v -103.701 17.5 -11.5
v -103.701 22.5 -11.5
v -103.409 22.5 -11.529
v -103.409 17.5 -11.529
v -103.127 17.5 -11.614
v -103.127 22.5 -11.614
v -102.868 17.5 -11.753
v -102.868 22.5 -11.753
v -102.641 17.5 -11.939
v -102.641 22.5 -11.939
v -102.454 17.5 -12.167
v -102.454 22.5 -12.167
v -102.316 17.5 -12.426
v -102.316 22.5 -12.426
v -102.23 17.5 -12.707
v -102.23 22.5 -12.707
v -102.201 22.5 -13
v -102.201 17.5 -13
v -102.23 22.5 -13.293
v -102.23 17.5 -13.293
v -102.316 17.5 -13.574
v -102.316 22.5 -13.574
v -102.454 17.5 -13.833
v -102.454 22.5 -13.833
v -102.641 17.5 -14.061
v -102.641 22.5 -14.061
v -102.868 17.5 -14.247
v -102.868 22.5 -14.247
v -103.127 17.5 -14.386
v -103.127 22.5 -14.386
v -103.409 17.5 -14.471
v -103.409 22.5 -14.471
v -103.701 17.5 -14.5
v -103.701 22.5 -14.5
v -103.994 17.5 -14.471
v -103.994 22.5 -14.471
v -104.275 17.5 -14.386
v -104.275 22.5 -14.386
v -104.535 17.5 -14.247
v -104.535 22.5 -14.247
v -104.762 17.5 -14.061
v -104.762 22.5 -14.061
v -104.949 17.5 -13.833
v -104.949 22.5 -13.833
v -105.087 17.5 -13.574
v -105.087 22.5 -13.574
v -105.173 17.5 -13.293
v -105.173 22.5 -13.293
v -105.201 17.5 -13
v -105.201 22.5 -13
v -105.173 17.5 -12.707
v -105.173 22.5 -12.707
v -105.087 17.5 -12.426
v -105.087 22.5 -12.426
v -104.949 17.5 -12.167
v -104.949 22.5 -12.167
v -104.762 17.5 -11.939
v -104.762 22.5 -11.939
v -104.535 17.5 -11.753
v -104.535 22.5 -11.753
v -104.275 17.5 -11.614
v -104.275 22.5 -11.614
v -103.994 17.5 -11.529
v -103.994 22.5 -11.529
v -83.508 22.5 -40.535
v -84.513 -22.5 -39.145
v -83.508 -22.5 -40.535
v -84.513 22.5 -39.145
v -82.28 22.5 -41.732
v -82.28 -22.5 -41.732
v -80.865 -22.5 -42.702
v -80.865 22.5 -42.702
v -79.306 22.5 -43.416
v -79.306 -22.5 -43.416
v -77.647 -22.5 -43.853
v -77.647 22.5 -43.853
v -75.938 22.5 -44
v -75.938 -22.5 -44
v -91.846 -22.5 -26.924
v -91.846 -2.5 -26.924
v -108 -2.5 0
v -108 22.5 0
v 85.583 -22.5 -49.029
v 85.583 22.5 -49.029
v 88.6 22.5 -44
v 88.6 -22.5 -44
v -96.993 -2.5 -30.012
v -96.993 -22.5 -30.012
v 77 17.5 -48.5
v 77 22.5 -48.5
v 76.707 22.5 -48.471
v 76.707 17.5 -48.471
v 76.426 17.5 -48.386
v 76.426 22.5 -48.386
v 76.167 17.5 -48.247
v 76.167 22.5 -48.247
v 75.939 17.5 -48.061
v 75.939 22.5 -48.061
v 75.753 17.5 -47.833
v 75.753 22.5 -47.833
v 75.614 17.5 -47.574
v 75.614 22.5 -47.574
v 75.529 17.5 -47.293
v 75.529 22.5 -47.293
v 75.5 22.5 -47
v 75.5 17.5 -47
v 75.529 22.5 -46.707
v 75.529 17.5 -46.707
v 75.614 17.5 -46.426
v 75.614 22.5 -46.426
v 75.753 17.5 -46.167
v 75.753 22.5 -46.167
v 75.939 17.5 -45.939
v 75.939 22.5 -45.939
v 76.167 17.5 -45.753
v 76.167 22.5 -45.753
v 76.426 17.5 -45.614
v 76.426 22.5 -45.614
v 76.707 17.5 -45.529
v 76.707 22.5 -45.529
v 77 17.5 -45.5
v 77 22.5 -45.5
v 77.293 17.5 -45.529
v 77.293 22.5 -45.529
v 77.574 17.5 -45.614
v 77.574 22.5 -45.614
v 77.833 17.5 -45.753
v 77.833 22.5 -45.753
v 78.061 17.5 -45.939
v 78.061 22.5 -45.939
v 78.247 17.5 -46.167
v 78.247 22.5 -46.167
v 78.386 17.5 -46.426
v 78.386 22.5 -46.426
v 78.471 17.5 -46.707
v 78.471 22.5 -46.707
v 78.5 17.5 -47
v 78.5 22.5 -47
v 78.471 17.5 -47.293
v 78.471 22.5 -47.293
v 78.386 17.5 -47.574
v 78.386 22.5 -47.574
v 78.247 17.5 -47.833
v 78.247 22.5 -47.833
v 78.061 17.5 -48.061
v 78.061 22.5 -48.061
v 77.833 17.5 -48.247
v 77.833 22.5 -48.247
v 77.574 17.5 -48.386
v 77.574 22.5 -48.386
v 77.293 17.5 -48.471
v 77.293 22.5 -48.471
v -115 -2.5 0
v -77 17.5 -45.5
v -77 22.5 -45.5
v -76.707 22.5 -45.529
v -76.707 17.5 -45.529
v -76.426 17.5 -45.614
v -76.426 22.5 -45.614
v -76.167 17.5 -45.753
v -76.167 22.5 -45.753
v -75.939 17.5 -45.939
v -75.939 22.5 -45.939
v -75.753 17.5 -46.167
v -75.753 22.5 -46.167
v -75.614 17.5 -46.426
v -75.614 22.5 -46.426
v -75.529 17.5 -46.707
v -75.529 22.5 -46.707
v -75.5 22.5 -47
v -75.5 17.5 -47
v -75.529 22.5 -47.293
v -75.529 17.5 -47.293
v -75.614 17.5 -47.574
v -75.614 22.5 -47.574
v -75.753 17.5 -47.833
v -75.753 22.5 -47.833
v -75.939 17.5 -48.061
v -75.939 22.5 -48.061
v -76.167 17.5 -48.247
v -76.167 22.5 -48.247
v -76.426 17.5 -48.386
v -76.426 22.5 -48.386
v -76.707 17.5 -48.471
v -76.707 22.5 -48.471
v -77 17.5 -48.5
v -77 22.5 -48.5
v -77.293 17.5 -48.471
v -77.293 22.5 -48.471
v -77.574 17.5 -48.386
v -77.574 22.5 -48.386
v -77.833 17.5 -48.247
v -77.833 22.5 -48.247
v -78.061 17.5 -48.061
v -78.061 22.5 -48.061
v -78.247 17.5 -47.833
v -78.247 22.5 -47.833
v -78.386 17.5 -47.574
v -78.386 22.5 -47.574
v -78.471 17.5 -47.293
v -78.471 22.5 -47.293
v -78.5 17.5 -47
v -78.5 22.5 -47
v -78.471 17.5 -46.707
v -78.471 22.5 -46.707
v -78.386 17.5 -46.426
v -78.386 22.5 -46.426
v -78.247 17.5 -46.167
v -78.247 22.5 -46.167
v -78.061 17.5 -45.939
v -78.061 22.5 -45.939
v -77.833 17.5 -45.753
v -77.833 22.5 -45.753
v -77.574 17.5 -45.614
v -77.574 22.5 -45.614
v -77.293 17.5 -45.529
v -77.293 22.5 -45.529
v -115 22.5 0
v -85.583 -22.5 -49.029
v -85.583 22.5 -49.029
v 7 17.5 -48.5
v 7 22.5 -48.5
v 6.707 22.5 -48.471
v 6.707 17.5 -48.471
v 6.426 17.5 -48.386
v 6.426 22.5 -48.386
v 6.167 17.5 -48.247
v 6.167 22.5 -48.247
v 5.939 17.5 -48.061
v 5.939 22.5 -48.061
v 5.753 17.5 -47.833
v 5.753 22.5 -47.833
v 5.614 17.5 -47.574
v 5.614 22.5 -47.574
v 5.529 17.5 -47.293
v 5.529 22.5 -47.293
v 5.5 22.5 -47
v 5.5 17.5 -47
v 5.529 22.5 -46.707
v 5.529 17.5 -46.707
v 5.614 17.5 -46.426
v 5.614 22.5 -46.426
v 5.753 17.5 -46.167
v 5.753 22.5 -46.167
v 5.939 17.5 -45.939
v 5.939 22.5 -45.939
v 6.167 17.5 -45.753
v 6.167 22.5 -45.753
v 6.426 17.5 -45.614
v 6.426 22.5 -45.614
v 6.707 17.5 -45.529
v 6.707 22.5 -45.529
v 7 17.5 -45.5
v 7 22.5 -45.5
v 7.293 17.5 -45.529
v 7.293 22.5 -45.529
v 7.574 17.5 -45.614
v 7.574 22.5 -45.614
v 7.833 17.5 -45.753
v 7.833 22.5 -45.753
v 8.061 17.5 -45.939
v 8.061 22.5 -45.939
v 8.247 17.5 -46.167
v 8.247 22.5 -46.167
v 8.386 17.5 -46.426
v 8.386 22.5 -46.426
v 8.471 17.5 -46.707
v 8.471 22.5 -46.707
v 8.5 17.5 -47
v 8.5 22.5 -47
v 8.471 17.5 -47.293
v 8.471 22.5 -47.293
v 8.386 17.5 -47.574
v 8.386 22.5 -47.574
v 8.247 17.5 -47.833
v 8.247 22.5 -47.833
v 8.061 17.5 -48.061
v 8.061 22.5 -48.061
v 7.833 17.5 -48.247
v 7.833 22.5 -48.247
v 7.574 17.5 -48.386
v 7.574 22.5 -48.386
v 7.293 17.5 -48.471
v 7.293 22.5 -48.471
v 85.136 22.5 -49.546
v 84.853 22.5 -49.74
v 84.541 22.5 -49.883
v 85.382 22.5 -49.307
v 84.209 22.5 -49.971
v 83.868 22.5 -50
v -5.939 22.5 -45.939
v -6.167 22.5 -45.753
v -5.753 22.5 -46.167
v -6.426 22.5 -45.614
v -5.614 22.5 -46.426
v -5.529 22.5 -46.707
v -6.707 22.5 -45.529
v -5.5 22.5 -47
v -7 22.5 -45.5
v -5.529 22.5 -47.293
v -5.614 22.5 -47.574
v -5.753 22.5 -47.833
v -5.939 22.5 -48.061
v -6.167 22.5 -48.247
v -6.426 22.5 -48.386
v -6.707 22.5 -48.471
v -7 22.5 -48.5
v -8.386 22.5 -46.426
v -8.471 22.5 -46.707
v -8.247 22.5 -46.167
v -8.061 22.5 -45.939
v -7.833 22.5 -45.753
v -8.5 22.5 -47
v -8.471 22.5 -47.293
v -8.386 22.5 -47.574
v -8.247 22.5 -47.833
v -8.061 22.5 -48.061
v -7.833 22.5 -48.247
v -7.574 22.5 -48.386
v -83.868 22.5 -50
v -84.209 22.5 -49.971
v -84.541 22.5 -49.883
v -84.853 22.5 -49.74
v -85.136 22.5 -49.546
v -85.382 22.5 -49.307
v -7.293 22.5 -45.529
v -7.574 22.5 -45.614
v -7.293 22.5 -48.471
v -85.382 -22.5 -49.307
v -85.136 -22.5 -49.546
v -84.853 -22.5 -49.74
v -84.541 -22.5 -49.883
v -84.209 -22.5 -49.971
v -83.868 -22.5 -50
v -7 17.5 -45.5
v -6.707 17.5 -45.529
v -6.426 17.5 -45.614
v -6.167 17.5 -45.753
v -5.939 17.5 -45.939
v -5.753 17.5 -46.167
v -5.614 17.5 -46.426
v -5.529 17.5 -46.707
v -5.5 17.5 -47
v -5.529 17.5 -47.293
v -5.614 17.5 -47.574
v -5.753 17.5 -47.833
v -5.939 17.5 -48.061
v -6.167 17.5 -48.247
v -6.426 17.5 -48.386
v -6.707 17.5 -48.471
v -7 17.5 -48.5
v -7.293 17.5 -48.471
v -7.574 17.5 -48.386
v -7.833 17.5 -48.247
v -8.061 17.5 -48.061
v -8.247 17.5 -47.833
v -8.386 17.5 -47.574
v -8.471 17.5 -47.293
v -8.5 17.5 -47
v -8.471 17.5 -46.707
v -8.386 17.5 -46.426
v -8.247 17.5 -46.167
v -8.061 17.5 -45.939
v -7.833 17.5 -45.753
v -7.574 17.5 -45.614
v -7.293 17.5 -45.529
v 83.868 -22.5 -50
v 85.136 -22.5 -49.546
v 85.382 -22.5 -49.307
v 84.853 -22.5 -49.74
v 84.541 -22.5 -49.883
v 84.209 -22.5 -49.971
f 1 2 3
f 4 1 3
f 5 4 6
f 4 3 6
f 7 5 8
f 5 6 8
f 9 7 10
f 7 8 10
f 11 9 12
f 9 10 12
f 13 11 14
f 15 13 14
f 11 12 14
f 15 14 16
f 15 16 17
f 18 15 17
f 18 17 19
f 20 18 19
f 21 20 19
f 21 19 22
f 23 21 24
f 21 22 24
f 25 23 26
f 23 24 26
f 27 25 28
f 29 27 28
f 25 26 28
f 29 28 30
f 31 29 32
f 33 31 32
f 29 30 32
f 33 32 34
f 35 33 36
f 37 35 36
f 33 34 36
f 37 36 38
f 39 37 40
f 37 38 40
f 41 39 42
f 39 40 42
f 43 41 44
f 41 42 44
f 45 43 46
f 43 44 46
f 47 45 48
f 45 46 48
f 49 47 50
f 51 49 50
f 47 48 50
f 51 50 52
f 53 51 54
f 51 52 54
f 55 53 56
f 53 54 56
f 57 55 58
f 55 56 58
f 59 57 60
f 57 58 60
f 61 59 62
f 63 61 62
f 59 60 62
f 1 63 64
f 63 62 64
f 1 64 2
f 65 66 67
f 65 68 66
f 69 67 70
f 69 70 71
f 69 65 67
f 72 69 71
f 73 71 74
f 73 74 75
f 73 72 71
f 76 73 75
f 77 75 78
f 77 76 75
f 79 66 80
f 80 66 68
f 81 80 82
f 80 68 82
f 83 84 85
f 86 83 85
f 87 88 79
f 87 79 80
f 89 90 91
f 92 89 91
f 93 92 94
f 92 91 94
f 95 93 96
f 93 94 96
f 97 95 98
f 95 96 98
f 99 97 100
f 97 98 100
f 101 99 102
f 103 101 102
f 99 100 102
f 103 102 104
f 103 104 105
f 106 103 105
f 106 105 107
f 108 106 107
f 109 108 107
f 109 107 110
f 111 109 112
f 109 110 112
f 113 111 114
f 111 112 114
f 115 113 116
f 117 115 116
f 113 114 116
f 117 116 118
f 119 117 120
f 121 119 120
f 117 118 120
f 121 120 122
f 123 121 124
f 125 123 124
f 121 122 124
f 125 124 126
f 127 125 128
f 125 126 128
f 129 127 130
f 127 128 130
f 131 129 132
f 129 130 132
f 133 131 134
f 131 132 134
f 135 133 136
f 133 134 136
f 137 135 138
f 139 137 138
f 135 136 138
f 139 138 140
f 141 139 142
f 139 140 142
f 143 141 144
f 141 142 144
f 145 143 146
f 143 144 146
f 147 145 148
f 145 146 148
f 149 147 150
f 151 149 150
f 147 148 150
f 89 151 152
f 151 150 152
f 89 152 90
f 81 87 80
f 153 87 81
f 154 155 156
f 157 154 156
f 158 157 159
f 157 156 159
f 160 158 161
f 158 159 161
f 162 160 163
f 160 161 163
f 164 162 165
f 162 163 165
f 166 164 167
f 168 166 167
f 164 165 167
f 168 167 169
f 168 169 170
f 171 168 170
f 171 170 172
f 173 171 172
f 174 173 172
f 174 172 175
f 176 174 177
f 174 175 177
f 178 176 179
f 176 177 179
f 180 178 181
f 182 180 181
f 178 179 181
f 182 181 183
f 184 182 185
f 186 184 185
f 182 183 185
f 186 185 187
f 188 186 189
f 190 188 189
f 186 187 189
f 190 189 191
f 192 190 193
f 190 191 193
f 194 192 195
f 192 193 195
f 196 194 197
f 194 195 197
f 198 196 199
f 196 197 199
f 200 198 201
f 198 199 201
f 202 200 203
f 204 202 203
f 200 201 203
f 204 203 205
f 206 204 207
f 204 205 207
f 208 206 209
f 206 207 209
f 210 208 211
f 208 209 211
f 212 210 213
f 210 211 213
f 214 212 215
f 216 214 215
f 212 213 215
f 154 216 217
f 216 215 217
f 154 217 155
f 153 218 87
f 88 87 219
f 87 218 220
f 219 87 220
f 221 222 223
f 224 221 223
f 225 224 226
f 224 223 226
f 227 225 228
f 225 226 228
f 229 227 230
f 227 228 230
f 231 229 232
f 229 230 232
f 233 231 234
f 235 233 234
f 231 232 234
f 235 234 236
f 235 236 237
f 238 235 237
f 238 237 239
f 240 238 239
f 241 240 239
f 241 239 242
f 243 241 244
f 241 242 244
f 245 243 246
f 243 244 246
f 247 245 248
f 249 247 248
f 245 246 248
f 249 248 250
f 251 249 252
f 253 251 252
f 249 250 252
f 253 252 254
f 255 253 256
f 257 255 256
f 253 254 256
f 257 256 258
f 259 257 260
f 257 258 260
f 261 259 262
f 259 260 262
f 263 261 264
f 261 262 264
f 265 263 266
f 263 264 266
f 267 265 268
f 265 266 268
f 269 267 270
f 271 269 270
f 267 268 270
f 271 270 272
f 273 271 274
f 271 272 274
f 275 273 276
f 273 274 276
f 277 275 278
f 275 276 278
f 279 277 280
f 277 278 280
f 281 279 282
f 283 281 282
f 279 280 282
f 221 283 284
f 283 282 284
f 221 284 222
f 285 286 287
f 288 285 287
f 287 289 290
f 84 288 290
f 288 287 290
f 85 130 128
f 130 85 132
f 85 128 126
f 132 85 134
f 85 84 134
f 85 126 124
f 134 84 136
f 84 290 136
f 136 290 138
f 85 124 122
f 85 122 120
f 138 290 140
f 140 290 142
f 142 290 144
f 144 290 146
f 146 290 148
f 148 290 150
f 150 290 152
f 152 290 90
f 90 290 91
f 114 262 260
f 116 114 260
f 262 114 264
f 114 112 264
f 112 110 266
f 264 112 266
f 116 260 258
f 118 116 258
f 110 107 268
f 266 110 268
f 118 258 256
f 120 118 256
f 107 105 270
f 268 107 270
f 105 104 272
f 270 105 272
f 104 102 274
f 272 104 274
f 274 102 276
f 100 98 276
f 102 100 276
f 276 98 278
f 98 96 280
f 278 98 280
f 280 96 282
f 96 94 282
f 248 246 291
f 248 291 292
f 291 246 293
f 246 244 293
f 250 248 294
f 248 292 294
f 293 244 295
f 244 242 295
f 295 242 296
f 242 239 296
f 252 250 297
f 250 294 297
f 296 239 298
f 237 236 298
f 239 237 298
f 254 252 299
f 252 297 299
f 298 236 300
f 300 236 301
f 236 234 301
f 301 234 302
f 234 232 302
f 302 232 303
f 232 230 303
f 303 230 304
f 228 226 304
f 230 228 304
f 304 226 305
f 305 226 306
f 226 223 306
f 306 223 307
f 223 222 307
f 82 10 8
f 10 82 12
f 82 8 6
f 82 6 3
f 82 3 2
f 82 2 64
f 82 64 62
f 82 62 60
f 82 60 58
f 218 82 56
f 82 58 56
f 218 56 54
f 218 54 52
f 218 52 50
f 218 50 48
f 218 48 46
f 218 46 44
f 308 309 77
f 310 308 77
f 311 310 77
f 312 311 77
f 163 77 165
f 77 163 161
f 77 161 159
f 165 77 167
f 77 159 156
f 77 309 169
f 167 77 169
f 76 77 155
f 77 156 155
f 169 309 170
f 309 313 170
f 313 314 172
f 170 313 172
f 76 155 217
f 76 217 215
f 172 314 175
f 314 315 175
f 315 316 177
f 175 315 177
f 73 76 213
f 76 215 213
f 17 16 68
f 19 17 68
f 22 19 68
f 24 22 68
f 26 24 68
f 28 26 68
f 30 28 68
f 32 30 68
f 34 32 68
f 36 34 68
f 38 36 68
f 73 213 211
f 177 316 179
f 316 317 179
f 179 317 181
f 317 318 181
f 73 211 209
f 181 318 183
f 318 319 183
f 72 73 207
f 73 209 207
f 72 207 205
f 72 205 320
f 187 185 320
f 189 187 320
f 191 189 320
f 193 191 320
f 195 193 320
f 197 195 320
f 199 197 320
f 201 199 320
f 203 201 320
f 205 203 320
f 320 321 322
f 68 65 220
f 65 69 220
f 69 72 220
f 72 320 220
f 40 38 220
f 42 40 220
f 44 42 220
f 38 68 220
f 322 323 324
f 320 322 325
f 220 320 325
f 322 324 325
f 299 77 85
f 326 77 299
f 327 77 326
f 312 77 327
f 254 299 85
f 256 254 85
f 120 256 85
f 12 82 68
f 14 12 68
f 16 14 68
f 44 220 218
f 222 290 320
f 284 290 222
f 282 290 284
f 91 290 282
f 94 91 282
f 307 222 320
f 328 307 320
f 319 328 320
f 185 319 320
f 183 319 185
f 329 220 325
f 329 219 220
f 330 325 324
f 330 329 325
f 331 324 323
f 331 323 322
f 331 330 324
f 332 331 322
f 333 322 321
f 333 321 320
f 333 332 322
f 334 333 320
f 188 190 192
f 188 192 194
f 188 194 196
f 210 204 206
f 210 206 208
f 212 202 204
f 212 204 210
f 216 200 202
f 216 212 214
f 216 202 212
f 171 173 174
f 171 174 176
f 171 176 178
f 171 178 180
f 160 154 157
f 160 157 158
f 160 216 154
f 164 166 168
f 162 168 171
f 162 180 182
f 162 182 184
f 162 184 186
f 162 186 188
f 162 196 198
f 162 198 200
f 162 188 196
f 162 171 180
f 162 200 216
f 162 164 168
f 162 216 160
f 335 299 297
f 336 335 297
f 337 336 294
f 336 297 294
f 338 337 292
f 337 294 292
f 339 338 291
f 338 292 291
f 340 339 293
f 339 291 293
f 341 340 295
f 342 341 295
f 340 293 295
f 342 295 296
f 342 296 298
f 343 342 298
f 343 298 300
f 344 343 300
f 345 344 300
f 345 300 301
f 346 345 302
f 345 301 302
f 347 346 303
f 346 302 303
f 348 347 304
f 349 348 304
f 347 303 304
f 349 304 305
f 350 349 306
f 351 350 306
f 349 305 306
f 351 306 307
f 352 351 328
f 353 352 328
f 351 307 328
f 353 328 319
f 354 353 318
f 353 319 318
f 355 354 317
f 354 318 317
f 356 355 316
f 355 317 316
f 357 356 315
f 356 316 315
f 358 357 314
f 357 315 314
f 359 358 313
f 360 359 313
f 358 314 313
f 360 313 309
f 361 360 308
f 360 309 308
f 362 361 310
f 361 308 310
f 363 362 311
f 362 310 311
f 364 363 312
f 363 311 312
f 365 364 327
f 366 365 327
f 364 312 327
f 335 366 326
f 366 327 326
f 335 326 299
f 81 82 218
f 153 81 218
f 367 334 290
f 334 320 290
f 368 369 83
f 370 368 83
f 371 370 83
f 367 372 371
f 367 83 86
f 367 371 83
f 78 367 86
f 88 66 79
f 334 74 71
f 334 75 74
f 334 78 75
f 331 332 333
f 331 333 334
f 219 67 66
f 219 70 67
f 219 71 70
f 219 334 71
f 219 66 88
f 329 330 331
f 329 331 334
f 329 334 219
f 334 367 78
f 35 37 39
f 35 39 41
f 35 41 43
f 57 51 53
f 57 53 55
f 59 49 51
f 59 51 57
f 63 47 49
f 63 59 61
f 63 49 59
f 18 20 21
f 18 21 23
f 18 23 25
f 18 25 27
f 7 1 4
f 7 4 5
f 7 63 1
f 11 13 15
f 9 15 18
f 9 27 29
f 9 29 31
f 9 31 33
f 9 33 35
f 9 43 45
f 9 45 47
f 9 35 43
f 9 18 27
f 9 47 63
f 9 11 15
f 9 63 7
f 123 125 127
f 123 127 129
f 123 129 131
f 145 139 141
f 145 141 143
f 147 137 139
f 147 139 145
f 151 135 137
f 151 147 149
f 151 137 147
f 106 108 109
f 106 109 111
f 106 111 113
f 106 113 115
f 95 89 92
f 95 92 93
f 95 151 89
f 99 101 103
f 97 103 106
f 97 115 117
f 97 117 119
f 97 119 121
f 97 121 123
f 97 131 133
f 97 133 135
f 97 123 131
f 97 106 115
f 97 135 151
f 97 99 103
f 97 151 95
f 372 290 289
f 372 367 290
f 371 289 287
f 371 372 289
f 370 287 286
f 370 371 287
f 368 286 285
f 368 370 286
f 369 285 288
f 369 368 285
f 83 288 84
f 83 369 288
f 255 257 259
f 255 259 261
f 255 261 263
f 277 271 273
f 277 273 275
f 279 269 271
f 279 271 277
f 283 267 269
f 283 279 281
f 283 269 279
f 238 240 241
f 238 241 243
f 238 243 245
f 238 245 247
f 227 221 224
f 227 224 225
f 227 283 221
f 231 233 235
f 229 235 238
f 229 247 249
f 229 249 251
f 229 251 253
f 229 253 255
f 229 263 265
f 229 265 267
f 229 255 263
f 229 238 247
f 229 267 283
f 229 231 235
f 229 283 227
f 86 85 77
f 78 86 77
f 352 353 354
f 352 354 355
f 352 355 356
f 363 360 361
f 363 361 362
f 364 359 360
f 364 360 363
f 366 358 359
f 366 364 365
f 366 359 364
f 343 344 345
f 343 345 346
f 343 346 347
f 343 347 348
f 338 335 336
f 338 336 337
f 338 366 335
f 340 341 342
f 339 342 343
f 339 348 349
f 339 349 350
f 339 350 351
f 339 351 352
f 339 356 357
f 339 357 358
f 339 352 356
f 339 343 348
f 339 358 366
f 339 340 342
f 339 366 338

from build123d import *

# Parameters (mm, degrees)
BOSS_EXTRUDE1_DEPTH = 22.5
SKETCH2_R           = 1.5
CUT_EXTRUDE1_DEPTH  = 5
FILLET1_R           = 2
SKETCH3_W           = 35
SKETCH3_H           = 20
CUT_EXTRUDE2_DEPTH  = 10
SKETCH6_W           = 44
SKETCH6_H           = 45
CUT_EXTRUDE3_DEPTH  = 128.401923062
FILLET2_R           = 10


with BuildPart() as part:
    # Sketch1 → Boss-Extrude1 (new, symmetric)
    with BuildSketch(Plane(origin=(0, 0, 0), x_dir=(1, 0, 0), z_dir=(0, 1, 0))):
        Polygon((-115, 0), (-85, 50), (85, 50), (115, 0), (108, 0), (81.6, 44), (-81.6, 44), (-108, 0), align=None)
    extrude(amount=BOSS_EXTRUDE1_DEPTH, both=True)

    # Sketch2 → Cut-Extrude1 (cut)
    with BuildSketch(Plane(origin=(0, 22.5, 0), x_dir=(1, 0, 0), z_dir=(0, 1, 0))):
        with Locations(Location((-103.701428863, 13, 0), (0, 0, 270))):
            Circle(SKETCH2_R)
        with Locations(Location((-77, 47, 0), (0, 0, 270))):
            Circle(SKETCH2_R)
        with Locations(Location((-7, 47, 0), (0, 0, 270))):
            Circle(SKETCH2_R)
        with Locations(Location((7, 47, 0), (0, 0, 90))):
            Circle(SKETCH2_R)
        with Locations(Location((77, 47, 0), (0, 0, 90))):
            Circle(SKETCH2_R)
        with Locations(Location((103.701428863, 13, 0), (0, 0, 90))):
            Circle(SKETCH2_R)
    extrude(amount=-CUT_EXTRUDE1_DEPTH, mode=Mode.SUBTRACT)

    # Fillet1
    fillet1_edges = [part.edges().sort_by_distance(p)[0] for p in [
        (-85, 0, -50),
        (85, 0, -50),
    ]]
    fillet(fillet1_edges, radius=FILLET1_R)

    # Sketch3 → Cut-Extrude2 (cut)
    with BuildSketch(Plane(origin=(-84.558823529, 0, -50.735294118), x_dir=(-0.5144957554275263, 0, 0.8574929257125444), z_dir=(-0.8574929257125444, 0, -0.5144957554275263))):
        with Locations((41.667011874, -12.5)):
            Rectangle(SKETCH3_W, SKETCH3_H)
    extrude(amount=-CUT_EXTRUDE2_DEPTH, mode=Mode.SUBTRACT)

    # Sketch6 → Cut-Extrude3 (cut, through all)
    with BuildSketch(Plane(origin=(0, 0, 0), x_dir=(0, 0, -1), z_dir=(1, 0, 0))):
        with Locations((22, 0)):
            Rectangle(SKETCH6_W, SKETCH6_H)
    extrude(amount=CUT_EXTRUDE3_DEPTH, mode=Mode.SUBTRACT)

    # Fillet2
    fillet2_edges = [part.edges().sort_by_distance(p)[0] for p in [
        (-81.6, 0, -44),
    ]]
    fillet(fillet2_edges, radius=FILLET2_R)


solid = part.part
